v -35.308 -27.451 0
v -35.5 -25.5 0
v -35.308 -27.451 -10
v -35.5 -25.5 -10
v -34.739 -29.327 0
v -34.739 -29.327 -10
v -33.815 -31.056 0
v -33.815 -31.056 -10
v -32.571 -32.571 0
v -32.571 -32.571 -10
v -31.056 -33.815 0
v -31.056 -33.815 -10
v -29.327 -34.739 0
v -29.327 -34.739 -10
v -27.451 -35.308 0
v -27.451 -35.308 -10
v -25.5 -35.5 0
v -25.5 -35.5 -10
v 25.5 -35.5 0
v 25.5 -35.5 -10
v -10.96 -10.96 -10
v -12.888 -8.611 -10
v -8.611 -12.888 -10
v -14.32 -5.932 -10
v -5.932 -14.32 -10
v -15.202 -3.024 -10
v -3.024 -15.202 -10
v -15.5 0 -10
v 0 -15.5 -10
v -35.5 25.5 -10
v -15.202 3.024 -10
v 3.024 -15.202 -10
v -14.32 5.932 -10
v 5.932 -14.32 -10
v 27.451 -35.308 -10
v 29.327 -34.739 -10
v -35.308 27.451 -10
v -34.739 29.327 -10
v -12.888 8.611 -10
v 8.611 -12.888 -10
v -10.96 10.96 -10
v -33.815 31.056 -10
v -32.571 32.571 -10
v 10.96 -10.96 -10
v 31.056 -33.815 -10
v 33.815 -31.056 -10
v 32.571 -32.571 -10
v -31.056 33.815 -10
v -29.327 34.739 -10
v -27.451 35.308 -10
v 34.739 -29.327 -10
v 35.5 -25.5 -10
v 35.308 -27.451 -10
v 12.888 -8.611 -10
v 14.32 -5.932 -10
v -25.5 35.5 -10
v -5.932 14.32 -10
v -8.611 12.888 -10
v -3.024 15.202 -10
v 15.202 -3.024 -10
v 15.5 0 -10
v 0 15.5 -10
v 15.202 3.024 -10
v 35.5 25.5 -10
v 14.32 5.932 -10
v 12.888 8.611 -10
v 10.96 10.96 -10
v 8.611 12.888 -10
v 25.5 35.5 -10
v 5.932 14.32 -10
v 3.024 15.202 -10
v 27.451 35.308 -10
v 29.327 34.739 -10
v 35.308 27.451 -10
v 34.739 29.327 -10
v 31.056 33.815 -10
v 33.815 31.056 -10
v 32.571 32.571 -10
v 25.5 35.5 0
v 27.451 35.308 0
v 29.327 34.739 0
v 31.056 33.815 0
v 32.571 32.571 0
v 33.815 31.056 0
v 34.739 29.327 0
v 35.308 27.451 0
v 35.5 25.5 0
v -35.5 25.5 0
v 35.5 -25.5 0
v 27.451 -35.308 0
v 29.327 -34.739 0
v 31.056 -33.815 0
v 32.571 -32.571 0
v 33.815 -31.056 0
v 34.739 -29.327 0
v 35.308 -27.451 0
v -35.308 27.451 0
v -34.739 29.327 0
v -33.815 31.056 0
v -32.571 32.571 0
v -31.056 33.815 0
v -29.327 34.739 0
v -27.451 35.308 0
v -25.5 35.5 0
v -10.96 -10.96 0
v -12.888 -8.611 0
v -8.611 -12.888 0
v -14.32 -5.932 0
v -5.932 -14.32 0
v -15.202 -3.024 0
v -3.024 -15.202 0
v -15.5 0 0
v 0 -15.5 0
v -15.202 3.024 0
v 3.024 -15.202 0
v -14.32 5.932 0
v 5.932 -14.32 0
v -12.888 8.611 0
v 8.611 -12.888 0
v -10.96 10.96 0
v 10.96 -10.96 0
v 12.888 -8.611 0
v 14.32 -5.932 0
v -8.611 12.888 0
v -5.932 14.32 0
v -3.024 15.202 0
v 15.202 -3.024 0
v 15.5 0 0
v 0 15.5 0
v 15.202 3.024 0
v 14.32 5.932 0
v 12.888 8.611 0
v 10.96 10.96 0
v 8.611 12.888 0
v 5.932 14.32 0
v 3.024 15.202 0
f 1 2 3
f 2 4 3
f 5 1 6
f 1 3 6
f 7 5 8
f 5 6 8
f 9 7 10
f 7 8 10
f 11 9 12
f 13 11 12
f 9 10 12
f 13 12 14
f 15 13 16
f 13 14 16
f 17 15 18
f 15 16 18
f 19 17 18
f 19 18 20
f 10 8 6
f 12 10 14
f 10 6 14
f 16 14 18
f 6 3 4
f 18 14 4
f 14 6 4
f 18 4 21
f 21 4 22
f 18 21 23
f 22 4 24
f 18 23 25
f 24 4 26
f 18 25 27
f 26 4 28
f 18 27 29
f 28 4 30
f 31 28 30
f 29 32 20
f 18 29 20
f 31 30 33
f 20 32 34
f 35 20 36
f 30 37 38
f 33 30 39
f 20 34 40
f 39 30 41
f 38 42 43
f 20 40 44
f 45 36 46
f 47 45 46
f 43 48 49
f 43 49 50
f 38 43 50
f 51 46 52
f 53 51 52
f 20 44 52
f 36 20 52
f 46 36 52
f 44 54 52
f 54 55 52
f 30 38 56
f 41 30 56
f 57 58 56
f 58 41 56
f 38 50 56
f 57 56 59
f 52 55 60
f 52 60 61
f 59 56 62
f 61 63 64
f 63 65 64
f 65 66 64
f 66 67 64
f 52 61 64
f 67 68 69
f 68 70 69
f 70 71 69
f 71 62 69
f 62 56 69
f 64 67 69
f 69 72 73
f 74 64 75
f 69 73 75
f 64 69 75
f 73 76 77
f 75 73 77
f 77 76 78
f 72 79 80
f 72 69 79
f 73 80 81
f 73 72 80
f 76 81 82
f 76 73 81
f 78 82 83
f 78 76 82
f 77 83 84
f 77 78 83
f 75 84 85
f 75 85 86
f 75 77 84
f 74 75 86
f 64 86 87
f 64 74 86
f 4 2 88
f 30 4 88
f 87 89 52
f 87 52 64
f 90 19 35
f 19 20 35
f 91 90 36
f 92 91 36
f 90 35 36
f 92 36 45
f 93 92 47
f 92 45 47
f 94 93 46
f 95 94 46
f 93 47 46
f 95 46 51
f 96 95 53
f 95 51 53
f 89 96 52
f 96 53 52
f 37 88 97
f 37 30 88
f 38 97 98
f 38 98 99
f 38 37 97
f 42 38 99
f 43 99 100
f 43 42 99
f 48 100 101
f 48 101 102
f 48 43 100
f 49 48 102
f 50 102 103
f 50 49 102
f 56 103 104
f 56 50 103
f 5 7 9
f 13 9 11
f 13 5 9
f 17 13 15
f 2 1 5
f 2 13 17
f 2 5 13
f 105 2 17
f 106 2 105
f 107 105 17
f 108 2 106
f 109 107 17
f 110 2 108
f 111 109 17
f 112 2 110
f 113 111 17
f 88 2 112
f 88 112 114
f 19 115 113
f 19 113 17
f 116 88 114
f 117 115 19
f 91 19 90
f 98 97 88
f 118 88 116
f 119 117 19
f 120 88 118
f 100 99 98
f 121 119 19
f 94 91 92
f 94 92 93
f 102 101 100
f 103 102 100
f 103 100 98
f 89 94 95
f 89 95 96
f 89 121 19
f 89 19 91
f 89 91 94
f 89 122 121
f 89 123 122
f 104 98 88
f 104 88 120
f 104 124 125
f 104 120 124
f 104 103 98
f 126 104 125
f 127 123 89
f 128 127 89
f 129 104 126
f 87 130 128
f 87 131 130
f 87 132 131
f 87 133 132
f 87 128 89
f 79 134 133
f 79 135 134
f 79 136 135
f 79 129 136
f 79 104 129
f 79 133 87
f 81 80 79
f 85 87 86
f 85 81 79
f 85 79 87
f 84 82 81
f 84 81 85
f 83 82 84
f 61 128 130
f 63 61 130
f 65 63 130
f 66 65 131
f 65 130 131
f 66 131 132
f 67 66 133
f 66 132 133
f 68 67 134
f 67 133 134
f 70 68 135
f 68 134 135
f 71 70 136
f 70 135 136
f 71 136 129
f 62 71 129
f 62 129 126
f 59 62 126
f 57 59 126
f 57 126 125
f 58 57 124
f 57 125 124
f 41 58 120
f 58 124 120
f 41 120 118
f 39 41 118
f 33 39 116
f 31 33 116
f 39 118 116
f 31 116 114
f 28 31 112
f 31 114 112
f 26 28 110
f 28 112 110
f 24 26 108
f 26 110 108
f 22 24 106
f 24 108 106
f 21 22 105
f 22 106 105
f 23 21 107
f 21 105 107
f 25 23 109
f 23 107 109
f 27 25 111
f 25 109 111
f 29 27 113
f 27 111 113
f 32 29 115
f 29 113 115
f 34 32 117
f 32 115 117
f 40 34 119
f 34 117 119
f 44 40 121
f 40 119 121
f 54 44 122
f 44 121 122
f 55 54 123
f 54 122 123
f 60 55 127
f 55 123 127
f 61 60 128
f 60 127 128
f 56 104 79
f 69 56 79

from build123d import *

# Parameters (mm, degrees)
IZIM1_W            = 71
IZIM1_H            = 71
IZIM1_R            = 15.5
TABAN_FLAN_1_DEPTH = 10
RADYUS1_R          = 10


# Sheet-metal steps are written as plain solids
with BuildPart() as part:
    # Çizim1 → Taban-Flanş1 (new body)
    with BuildSketch(Plane.XY):
        Rectangle(IZIM1_W, IZIM1_H)
        Circle(IZIM1_R, mode=Mode.SUBTRACT)
    extrude(amount=-TABAN_FLAN_1_DEPTH)

    # Radyus1
    radyus1_edges = [part.edges().sort_by_distance(p)[0] for p in [
        (35.5, -35.5, -5),
        (-35.5, -35.5, -5),
        (-35.5, 35.5, -5),
        (35.5, 35.5, -5),
    ]]
    fillet(radyus1_edges, radius=RADYUS1_R)


solid = part.part
